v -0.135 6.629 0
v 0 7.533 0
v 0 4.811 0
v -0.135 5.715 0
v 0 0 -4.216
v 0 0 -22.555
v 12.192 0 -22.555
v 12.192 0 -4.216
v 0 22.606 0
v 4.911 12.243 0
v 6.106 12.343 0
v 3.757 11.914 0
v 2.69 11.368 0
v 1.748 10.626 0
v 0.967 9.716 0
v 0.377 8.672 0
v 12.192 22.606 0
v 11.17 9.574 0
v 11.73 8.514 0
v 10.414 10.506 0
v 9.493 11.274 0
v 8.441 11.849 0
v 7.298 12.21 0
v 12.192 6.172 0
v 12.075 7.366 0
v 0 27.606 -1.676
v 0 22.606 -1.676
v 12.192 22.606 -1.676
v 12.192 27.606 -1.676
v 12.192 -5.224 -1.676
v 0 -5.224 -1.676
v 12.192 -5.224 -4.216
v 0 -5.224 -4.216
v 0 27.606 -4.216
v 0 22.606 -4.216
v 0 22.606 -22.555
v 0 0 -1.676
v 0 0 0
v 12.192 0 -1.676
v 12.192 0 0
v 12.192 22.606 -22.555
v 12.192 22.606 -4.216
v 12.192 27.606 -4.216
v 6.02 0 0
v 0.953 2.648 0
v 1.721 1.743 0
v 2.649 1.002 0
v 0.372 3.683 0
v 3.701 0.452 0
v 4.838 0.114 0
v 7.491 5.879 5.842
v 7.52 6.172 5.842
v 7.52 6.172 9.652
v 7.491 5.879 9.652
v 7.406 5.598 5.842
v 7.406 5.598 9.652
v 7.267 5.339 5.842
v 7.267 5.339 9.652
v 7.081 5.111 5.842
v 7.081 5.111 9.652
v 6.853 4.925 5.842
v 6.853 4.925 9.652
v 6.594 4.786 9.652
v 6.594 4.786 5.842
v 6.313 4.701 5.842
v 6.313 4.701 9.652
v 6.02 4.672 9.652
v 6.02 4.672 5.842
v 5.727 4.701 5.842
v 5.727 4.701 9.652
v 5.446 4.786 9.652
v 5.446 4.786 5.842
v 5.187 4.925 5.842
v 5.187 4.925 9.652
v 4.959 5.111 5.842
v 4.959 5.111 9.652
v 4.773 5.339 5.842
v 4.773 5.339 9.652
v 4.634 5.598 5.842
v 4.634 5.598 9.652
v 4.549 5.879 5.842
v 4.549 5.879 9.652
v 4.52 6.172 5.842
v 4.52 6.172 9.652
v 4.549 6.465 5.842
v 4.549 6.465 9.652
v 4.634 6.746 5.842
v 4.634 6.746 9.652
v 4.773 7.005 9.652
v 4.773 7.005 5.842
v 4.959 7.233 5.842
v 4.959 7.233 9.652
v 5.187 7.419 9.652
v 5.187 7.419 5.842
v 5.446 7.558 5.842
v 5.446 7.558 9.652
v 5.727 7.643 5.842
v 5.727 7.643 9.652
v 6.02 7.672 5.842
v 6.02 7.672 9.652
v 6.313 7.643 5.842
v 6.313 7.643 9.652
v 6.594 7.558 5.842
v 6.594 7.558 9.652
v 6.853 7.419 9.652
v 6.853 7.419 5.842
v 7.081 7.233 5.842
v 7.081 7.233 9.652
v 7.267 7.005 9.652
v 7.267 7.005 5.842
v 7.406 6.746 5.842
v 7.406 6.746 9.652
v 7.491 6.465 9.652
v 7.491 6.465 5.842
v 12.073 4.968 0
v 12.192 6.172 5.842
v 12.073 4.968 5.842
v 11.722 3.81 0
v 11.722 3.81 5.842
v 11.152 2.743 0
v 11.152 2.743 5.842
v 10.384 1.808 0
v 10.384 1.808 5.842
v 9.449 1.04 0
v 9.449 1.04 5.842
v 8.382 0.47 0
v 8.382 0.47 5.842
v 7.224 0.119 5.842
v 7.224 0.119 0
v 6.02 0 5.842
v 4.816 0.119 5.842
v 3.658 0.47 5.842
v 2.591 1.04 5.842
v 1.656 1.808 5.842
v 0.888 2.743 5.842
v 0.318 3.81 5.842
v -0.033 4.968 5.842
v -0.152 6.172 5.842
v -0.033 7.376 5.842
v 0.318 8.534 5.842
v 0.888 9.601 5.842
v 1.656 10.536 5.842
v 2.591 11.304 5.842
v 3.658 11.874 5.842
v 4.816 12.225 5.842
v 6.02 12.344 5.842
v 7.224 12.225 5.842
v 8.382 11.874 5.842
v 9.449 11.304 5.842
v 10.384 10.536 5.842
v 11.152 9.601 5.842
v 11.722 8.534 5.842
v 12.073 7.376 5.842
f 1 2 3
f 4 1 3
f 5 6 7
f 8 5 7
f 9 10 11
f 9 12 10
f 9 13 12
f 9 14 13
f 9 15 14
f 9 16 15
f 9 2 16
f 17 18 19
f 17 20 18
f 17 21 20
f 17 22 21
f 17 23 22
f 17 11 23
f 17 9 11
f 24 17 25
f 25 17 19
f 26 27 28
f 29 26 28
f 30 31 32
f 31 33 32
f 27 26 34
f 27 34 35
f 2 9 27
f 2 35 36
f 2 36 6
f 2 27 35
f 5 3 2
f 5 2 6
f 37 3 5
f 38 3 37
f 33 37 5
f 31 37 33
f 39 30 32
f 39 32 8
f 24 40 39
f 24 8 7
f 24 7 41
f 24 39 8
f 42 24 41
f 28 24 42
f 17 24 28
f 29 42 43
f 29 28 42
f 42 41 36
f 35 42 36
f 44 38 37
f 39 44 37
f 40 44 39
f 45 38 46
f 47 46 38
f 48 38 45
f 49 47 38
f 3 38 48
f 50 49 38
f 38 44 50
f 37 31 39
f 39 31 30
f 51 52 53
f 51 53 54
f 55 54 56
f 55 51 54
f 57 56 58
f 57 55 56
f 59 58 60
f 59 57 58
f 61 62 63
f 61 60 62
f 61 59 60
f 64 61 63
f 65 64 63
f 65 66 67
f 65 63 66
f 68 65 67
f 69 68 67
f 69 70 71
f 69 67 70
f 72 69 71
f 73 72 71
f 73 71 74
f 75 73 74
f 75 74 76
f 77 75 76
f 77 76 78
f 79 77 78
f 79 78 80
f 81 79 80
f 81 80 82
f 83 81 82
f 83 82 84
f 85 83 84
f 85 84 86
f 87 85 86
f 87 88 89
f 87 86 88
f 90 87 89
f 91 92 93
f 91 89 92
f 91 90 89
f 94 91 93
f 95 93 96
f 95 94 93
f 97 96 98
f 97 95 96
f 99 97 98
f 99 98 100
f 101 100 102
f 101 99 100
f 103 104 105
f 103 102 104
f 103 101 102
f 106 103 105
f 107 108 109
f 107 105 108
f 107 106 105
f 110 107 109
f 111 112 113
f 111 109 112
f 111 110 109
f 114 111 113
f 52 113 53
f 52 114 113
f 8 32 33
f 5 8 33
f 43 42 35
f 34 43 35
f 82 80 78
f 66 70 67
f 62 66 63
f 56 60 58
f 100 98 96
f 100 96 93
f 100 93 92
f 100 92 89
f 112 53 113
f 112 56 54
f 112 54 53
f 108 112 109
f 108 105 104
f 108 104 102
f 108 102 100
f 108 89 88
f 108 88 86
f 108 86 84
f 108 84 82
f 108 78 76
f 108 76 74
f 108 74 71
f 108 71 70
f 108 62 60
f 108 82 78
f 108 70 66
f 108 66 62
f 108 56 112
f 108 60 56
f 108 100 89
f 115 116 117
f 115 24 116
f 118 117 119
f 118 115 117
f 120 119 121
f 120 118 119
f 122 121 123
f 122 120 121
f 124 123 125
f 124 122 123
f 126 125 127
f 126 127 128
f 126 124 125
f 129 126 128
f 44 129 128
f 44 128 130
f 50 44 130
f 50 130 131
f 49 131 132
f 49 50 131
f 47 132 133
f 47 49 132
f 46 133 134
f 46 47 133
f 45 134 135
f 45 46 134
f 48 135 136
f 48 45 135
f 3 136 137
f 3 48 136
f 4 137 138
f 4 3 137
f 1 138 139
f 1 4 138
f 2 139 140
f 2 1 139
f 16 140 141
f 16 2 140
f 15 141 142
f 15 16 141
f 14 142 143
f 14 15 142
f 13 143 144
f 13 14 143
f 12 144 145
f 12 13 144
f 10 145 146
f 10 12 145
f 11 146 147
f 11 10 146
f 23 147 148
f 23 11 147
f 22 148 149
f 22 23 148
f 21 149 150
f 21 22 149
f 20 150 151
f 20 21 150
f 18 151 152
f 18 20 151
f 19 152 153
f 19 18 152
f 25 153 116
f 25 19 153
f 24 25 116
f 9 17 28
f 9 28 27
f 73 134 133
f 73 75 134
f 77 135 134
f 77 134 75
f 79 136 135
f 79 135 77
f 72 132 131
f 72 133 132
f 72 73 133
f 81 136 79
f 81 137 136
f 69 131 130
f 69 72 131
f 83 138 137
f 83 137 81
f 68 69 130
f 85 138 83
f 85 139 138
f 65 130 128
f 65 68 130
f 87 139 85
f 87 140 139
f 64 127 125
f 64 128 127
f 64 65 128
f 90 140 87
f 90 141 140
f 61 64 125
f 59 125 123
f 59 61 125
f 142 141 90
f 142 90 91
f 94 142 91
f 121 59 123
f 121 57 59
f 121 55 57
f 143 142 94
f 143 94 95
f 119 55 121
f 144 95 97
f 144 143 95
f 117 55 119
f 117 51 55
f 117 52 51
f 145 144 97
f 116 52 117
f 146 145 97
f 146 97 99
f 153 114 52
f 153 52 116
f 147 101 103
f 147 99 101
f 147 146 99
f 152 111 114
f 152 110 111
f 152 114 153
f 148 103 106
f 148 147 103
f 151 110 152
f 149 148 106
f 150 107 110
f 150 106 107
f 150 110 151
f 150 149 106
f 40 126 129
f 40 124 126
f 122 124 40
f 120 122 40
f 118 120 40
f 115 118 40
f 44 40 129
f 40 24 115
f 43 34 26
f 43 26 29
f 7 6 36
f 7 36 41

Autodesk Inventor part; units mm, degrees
ref_plane "YZ Plane" through (0, 0, 0) normal (1, 0, 0) x (0, 1, 0)
ref_plane "XZ Plane" through (0, 0, 0) normal (0, 1, 0) x (-1, 0, 0)
ref_plane "XY Plane" through (0, 0, 0) normal (0, 0, 1) x (1, 0, 0)
sketch "Sketch1" plane through (0, 0, 0) normal (0, 0, 1) x (1, 0, 0)
  line L0 (0, 0) -> (12.192, 0)
  line L1 (12.192, 0) -> (12.192, 22.606)
  line L2 (12.192, 22.606) -> (0, 22.606)
  line L3 (0, 22.606) -> (0, 0)
  dimension "d0" = 12.192
  dimension "d1" = 22.606
extrude "Extrusion1" add sketch "Sketch1" against normal blind 22.5552
sketch "Sketch2" plane through (0, 22.606, 0) normal (0, 1, 0) x (1, 0, 0)
  line L0 (12.192, 0) -> (12.192, 22.5552) projected
  line L1 (0, 1.6764) -> (12.192, 1.6764)
  line L2 (12.192, 1.6764) -> (12.192, 4.2164)
  line L3 (12.192, 4.2164) -> (0, 4.2164)
  line L4 (0, 4.2164) -> (0, 1.6764)
  line L5 (12.192, 0) -> (0, 0) projected
  dimension "d4" = 2.54
  dimension "d5" = 1.6764
  dimension "d6" = 4.2164
extrude "Extrusion2" add sketch "Sketch2" along normal blind 5 and the other way blind 27.83
sketch "Sketch3" plane through (0, 0, 0) normal (0, 0, 1) x (1, 0, 0)
  circle A0 centre (6.02, 6.172) radius 6.172
  line L0 (12.192, 0) -> (12.192, 22.606) projected
  line L1 (0, 22.606) -> (0, 0) projected
  line L2 (0, 0) -> (12.192, 0) projected
  dimension "d11" = 6.172
  dimension "d12" = 12.192
  dimension "d13" = 6.02
  dimension "d14" = 12.344
extrude "Extrusion3" add sketch "Sketch3" along normal blind 5.842 contours A0 L1 | L1 A0
sketch "Sketch4" plane through (6.02, 6.172, 5.842) normal (0, 0, 1) x (1, 0, 0)
  circle A0 centre (0, 0) radius 1.5
  line L0 (0, -6.172) -> (6.172, -6.172) projected
  line L1 (6.172, 16.434) -> (-6.02, 16.434) projected
  line L2 (-6.02, 16.434) -> (-6.02, 1.3613) projected
  line L3 (6.172, 0) -> (6.172, 16.434) projected
  point P0 (-6.02, -6.172)
  dimension "d17" = 3
  dimension "d24" = 22.606
  dimension "d25" = 12.192
extrude "Extrusion4" add sketch "Sketch4" along normal blind 3.81
properties part number "small servo"
